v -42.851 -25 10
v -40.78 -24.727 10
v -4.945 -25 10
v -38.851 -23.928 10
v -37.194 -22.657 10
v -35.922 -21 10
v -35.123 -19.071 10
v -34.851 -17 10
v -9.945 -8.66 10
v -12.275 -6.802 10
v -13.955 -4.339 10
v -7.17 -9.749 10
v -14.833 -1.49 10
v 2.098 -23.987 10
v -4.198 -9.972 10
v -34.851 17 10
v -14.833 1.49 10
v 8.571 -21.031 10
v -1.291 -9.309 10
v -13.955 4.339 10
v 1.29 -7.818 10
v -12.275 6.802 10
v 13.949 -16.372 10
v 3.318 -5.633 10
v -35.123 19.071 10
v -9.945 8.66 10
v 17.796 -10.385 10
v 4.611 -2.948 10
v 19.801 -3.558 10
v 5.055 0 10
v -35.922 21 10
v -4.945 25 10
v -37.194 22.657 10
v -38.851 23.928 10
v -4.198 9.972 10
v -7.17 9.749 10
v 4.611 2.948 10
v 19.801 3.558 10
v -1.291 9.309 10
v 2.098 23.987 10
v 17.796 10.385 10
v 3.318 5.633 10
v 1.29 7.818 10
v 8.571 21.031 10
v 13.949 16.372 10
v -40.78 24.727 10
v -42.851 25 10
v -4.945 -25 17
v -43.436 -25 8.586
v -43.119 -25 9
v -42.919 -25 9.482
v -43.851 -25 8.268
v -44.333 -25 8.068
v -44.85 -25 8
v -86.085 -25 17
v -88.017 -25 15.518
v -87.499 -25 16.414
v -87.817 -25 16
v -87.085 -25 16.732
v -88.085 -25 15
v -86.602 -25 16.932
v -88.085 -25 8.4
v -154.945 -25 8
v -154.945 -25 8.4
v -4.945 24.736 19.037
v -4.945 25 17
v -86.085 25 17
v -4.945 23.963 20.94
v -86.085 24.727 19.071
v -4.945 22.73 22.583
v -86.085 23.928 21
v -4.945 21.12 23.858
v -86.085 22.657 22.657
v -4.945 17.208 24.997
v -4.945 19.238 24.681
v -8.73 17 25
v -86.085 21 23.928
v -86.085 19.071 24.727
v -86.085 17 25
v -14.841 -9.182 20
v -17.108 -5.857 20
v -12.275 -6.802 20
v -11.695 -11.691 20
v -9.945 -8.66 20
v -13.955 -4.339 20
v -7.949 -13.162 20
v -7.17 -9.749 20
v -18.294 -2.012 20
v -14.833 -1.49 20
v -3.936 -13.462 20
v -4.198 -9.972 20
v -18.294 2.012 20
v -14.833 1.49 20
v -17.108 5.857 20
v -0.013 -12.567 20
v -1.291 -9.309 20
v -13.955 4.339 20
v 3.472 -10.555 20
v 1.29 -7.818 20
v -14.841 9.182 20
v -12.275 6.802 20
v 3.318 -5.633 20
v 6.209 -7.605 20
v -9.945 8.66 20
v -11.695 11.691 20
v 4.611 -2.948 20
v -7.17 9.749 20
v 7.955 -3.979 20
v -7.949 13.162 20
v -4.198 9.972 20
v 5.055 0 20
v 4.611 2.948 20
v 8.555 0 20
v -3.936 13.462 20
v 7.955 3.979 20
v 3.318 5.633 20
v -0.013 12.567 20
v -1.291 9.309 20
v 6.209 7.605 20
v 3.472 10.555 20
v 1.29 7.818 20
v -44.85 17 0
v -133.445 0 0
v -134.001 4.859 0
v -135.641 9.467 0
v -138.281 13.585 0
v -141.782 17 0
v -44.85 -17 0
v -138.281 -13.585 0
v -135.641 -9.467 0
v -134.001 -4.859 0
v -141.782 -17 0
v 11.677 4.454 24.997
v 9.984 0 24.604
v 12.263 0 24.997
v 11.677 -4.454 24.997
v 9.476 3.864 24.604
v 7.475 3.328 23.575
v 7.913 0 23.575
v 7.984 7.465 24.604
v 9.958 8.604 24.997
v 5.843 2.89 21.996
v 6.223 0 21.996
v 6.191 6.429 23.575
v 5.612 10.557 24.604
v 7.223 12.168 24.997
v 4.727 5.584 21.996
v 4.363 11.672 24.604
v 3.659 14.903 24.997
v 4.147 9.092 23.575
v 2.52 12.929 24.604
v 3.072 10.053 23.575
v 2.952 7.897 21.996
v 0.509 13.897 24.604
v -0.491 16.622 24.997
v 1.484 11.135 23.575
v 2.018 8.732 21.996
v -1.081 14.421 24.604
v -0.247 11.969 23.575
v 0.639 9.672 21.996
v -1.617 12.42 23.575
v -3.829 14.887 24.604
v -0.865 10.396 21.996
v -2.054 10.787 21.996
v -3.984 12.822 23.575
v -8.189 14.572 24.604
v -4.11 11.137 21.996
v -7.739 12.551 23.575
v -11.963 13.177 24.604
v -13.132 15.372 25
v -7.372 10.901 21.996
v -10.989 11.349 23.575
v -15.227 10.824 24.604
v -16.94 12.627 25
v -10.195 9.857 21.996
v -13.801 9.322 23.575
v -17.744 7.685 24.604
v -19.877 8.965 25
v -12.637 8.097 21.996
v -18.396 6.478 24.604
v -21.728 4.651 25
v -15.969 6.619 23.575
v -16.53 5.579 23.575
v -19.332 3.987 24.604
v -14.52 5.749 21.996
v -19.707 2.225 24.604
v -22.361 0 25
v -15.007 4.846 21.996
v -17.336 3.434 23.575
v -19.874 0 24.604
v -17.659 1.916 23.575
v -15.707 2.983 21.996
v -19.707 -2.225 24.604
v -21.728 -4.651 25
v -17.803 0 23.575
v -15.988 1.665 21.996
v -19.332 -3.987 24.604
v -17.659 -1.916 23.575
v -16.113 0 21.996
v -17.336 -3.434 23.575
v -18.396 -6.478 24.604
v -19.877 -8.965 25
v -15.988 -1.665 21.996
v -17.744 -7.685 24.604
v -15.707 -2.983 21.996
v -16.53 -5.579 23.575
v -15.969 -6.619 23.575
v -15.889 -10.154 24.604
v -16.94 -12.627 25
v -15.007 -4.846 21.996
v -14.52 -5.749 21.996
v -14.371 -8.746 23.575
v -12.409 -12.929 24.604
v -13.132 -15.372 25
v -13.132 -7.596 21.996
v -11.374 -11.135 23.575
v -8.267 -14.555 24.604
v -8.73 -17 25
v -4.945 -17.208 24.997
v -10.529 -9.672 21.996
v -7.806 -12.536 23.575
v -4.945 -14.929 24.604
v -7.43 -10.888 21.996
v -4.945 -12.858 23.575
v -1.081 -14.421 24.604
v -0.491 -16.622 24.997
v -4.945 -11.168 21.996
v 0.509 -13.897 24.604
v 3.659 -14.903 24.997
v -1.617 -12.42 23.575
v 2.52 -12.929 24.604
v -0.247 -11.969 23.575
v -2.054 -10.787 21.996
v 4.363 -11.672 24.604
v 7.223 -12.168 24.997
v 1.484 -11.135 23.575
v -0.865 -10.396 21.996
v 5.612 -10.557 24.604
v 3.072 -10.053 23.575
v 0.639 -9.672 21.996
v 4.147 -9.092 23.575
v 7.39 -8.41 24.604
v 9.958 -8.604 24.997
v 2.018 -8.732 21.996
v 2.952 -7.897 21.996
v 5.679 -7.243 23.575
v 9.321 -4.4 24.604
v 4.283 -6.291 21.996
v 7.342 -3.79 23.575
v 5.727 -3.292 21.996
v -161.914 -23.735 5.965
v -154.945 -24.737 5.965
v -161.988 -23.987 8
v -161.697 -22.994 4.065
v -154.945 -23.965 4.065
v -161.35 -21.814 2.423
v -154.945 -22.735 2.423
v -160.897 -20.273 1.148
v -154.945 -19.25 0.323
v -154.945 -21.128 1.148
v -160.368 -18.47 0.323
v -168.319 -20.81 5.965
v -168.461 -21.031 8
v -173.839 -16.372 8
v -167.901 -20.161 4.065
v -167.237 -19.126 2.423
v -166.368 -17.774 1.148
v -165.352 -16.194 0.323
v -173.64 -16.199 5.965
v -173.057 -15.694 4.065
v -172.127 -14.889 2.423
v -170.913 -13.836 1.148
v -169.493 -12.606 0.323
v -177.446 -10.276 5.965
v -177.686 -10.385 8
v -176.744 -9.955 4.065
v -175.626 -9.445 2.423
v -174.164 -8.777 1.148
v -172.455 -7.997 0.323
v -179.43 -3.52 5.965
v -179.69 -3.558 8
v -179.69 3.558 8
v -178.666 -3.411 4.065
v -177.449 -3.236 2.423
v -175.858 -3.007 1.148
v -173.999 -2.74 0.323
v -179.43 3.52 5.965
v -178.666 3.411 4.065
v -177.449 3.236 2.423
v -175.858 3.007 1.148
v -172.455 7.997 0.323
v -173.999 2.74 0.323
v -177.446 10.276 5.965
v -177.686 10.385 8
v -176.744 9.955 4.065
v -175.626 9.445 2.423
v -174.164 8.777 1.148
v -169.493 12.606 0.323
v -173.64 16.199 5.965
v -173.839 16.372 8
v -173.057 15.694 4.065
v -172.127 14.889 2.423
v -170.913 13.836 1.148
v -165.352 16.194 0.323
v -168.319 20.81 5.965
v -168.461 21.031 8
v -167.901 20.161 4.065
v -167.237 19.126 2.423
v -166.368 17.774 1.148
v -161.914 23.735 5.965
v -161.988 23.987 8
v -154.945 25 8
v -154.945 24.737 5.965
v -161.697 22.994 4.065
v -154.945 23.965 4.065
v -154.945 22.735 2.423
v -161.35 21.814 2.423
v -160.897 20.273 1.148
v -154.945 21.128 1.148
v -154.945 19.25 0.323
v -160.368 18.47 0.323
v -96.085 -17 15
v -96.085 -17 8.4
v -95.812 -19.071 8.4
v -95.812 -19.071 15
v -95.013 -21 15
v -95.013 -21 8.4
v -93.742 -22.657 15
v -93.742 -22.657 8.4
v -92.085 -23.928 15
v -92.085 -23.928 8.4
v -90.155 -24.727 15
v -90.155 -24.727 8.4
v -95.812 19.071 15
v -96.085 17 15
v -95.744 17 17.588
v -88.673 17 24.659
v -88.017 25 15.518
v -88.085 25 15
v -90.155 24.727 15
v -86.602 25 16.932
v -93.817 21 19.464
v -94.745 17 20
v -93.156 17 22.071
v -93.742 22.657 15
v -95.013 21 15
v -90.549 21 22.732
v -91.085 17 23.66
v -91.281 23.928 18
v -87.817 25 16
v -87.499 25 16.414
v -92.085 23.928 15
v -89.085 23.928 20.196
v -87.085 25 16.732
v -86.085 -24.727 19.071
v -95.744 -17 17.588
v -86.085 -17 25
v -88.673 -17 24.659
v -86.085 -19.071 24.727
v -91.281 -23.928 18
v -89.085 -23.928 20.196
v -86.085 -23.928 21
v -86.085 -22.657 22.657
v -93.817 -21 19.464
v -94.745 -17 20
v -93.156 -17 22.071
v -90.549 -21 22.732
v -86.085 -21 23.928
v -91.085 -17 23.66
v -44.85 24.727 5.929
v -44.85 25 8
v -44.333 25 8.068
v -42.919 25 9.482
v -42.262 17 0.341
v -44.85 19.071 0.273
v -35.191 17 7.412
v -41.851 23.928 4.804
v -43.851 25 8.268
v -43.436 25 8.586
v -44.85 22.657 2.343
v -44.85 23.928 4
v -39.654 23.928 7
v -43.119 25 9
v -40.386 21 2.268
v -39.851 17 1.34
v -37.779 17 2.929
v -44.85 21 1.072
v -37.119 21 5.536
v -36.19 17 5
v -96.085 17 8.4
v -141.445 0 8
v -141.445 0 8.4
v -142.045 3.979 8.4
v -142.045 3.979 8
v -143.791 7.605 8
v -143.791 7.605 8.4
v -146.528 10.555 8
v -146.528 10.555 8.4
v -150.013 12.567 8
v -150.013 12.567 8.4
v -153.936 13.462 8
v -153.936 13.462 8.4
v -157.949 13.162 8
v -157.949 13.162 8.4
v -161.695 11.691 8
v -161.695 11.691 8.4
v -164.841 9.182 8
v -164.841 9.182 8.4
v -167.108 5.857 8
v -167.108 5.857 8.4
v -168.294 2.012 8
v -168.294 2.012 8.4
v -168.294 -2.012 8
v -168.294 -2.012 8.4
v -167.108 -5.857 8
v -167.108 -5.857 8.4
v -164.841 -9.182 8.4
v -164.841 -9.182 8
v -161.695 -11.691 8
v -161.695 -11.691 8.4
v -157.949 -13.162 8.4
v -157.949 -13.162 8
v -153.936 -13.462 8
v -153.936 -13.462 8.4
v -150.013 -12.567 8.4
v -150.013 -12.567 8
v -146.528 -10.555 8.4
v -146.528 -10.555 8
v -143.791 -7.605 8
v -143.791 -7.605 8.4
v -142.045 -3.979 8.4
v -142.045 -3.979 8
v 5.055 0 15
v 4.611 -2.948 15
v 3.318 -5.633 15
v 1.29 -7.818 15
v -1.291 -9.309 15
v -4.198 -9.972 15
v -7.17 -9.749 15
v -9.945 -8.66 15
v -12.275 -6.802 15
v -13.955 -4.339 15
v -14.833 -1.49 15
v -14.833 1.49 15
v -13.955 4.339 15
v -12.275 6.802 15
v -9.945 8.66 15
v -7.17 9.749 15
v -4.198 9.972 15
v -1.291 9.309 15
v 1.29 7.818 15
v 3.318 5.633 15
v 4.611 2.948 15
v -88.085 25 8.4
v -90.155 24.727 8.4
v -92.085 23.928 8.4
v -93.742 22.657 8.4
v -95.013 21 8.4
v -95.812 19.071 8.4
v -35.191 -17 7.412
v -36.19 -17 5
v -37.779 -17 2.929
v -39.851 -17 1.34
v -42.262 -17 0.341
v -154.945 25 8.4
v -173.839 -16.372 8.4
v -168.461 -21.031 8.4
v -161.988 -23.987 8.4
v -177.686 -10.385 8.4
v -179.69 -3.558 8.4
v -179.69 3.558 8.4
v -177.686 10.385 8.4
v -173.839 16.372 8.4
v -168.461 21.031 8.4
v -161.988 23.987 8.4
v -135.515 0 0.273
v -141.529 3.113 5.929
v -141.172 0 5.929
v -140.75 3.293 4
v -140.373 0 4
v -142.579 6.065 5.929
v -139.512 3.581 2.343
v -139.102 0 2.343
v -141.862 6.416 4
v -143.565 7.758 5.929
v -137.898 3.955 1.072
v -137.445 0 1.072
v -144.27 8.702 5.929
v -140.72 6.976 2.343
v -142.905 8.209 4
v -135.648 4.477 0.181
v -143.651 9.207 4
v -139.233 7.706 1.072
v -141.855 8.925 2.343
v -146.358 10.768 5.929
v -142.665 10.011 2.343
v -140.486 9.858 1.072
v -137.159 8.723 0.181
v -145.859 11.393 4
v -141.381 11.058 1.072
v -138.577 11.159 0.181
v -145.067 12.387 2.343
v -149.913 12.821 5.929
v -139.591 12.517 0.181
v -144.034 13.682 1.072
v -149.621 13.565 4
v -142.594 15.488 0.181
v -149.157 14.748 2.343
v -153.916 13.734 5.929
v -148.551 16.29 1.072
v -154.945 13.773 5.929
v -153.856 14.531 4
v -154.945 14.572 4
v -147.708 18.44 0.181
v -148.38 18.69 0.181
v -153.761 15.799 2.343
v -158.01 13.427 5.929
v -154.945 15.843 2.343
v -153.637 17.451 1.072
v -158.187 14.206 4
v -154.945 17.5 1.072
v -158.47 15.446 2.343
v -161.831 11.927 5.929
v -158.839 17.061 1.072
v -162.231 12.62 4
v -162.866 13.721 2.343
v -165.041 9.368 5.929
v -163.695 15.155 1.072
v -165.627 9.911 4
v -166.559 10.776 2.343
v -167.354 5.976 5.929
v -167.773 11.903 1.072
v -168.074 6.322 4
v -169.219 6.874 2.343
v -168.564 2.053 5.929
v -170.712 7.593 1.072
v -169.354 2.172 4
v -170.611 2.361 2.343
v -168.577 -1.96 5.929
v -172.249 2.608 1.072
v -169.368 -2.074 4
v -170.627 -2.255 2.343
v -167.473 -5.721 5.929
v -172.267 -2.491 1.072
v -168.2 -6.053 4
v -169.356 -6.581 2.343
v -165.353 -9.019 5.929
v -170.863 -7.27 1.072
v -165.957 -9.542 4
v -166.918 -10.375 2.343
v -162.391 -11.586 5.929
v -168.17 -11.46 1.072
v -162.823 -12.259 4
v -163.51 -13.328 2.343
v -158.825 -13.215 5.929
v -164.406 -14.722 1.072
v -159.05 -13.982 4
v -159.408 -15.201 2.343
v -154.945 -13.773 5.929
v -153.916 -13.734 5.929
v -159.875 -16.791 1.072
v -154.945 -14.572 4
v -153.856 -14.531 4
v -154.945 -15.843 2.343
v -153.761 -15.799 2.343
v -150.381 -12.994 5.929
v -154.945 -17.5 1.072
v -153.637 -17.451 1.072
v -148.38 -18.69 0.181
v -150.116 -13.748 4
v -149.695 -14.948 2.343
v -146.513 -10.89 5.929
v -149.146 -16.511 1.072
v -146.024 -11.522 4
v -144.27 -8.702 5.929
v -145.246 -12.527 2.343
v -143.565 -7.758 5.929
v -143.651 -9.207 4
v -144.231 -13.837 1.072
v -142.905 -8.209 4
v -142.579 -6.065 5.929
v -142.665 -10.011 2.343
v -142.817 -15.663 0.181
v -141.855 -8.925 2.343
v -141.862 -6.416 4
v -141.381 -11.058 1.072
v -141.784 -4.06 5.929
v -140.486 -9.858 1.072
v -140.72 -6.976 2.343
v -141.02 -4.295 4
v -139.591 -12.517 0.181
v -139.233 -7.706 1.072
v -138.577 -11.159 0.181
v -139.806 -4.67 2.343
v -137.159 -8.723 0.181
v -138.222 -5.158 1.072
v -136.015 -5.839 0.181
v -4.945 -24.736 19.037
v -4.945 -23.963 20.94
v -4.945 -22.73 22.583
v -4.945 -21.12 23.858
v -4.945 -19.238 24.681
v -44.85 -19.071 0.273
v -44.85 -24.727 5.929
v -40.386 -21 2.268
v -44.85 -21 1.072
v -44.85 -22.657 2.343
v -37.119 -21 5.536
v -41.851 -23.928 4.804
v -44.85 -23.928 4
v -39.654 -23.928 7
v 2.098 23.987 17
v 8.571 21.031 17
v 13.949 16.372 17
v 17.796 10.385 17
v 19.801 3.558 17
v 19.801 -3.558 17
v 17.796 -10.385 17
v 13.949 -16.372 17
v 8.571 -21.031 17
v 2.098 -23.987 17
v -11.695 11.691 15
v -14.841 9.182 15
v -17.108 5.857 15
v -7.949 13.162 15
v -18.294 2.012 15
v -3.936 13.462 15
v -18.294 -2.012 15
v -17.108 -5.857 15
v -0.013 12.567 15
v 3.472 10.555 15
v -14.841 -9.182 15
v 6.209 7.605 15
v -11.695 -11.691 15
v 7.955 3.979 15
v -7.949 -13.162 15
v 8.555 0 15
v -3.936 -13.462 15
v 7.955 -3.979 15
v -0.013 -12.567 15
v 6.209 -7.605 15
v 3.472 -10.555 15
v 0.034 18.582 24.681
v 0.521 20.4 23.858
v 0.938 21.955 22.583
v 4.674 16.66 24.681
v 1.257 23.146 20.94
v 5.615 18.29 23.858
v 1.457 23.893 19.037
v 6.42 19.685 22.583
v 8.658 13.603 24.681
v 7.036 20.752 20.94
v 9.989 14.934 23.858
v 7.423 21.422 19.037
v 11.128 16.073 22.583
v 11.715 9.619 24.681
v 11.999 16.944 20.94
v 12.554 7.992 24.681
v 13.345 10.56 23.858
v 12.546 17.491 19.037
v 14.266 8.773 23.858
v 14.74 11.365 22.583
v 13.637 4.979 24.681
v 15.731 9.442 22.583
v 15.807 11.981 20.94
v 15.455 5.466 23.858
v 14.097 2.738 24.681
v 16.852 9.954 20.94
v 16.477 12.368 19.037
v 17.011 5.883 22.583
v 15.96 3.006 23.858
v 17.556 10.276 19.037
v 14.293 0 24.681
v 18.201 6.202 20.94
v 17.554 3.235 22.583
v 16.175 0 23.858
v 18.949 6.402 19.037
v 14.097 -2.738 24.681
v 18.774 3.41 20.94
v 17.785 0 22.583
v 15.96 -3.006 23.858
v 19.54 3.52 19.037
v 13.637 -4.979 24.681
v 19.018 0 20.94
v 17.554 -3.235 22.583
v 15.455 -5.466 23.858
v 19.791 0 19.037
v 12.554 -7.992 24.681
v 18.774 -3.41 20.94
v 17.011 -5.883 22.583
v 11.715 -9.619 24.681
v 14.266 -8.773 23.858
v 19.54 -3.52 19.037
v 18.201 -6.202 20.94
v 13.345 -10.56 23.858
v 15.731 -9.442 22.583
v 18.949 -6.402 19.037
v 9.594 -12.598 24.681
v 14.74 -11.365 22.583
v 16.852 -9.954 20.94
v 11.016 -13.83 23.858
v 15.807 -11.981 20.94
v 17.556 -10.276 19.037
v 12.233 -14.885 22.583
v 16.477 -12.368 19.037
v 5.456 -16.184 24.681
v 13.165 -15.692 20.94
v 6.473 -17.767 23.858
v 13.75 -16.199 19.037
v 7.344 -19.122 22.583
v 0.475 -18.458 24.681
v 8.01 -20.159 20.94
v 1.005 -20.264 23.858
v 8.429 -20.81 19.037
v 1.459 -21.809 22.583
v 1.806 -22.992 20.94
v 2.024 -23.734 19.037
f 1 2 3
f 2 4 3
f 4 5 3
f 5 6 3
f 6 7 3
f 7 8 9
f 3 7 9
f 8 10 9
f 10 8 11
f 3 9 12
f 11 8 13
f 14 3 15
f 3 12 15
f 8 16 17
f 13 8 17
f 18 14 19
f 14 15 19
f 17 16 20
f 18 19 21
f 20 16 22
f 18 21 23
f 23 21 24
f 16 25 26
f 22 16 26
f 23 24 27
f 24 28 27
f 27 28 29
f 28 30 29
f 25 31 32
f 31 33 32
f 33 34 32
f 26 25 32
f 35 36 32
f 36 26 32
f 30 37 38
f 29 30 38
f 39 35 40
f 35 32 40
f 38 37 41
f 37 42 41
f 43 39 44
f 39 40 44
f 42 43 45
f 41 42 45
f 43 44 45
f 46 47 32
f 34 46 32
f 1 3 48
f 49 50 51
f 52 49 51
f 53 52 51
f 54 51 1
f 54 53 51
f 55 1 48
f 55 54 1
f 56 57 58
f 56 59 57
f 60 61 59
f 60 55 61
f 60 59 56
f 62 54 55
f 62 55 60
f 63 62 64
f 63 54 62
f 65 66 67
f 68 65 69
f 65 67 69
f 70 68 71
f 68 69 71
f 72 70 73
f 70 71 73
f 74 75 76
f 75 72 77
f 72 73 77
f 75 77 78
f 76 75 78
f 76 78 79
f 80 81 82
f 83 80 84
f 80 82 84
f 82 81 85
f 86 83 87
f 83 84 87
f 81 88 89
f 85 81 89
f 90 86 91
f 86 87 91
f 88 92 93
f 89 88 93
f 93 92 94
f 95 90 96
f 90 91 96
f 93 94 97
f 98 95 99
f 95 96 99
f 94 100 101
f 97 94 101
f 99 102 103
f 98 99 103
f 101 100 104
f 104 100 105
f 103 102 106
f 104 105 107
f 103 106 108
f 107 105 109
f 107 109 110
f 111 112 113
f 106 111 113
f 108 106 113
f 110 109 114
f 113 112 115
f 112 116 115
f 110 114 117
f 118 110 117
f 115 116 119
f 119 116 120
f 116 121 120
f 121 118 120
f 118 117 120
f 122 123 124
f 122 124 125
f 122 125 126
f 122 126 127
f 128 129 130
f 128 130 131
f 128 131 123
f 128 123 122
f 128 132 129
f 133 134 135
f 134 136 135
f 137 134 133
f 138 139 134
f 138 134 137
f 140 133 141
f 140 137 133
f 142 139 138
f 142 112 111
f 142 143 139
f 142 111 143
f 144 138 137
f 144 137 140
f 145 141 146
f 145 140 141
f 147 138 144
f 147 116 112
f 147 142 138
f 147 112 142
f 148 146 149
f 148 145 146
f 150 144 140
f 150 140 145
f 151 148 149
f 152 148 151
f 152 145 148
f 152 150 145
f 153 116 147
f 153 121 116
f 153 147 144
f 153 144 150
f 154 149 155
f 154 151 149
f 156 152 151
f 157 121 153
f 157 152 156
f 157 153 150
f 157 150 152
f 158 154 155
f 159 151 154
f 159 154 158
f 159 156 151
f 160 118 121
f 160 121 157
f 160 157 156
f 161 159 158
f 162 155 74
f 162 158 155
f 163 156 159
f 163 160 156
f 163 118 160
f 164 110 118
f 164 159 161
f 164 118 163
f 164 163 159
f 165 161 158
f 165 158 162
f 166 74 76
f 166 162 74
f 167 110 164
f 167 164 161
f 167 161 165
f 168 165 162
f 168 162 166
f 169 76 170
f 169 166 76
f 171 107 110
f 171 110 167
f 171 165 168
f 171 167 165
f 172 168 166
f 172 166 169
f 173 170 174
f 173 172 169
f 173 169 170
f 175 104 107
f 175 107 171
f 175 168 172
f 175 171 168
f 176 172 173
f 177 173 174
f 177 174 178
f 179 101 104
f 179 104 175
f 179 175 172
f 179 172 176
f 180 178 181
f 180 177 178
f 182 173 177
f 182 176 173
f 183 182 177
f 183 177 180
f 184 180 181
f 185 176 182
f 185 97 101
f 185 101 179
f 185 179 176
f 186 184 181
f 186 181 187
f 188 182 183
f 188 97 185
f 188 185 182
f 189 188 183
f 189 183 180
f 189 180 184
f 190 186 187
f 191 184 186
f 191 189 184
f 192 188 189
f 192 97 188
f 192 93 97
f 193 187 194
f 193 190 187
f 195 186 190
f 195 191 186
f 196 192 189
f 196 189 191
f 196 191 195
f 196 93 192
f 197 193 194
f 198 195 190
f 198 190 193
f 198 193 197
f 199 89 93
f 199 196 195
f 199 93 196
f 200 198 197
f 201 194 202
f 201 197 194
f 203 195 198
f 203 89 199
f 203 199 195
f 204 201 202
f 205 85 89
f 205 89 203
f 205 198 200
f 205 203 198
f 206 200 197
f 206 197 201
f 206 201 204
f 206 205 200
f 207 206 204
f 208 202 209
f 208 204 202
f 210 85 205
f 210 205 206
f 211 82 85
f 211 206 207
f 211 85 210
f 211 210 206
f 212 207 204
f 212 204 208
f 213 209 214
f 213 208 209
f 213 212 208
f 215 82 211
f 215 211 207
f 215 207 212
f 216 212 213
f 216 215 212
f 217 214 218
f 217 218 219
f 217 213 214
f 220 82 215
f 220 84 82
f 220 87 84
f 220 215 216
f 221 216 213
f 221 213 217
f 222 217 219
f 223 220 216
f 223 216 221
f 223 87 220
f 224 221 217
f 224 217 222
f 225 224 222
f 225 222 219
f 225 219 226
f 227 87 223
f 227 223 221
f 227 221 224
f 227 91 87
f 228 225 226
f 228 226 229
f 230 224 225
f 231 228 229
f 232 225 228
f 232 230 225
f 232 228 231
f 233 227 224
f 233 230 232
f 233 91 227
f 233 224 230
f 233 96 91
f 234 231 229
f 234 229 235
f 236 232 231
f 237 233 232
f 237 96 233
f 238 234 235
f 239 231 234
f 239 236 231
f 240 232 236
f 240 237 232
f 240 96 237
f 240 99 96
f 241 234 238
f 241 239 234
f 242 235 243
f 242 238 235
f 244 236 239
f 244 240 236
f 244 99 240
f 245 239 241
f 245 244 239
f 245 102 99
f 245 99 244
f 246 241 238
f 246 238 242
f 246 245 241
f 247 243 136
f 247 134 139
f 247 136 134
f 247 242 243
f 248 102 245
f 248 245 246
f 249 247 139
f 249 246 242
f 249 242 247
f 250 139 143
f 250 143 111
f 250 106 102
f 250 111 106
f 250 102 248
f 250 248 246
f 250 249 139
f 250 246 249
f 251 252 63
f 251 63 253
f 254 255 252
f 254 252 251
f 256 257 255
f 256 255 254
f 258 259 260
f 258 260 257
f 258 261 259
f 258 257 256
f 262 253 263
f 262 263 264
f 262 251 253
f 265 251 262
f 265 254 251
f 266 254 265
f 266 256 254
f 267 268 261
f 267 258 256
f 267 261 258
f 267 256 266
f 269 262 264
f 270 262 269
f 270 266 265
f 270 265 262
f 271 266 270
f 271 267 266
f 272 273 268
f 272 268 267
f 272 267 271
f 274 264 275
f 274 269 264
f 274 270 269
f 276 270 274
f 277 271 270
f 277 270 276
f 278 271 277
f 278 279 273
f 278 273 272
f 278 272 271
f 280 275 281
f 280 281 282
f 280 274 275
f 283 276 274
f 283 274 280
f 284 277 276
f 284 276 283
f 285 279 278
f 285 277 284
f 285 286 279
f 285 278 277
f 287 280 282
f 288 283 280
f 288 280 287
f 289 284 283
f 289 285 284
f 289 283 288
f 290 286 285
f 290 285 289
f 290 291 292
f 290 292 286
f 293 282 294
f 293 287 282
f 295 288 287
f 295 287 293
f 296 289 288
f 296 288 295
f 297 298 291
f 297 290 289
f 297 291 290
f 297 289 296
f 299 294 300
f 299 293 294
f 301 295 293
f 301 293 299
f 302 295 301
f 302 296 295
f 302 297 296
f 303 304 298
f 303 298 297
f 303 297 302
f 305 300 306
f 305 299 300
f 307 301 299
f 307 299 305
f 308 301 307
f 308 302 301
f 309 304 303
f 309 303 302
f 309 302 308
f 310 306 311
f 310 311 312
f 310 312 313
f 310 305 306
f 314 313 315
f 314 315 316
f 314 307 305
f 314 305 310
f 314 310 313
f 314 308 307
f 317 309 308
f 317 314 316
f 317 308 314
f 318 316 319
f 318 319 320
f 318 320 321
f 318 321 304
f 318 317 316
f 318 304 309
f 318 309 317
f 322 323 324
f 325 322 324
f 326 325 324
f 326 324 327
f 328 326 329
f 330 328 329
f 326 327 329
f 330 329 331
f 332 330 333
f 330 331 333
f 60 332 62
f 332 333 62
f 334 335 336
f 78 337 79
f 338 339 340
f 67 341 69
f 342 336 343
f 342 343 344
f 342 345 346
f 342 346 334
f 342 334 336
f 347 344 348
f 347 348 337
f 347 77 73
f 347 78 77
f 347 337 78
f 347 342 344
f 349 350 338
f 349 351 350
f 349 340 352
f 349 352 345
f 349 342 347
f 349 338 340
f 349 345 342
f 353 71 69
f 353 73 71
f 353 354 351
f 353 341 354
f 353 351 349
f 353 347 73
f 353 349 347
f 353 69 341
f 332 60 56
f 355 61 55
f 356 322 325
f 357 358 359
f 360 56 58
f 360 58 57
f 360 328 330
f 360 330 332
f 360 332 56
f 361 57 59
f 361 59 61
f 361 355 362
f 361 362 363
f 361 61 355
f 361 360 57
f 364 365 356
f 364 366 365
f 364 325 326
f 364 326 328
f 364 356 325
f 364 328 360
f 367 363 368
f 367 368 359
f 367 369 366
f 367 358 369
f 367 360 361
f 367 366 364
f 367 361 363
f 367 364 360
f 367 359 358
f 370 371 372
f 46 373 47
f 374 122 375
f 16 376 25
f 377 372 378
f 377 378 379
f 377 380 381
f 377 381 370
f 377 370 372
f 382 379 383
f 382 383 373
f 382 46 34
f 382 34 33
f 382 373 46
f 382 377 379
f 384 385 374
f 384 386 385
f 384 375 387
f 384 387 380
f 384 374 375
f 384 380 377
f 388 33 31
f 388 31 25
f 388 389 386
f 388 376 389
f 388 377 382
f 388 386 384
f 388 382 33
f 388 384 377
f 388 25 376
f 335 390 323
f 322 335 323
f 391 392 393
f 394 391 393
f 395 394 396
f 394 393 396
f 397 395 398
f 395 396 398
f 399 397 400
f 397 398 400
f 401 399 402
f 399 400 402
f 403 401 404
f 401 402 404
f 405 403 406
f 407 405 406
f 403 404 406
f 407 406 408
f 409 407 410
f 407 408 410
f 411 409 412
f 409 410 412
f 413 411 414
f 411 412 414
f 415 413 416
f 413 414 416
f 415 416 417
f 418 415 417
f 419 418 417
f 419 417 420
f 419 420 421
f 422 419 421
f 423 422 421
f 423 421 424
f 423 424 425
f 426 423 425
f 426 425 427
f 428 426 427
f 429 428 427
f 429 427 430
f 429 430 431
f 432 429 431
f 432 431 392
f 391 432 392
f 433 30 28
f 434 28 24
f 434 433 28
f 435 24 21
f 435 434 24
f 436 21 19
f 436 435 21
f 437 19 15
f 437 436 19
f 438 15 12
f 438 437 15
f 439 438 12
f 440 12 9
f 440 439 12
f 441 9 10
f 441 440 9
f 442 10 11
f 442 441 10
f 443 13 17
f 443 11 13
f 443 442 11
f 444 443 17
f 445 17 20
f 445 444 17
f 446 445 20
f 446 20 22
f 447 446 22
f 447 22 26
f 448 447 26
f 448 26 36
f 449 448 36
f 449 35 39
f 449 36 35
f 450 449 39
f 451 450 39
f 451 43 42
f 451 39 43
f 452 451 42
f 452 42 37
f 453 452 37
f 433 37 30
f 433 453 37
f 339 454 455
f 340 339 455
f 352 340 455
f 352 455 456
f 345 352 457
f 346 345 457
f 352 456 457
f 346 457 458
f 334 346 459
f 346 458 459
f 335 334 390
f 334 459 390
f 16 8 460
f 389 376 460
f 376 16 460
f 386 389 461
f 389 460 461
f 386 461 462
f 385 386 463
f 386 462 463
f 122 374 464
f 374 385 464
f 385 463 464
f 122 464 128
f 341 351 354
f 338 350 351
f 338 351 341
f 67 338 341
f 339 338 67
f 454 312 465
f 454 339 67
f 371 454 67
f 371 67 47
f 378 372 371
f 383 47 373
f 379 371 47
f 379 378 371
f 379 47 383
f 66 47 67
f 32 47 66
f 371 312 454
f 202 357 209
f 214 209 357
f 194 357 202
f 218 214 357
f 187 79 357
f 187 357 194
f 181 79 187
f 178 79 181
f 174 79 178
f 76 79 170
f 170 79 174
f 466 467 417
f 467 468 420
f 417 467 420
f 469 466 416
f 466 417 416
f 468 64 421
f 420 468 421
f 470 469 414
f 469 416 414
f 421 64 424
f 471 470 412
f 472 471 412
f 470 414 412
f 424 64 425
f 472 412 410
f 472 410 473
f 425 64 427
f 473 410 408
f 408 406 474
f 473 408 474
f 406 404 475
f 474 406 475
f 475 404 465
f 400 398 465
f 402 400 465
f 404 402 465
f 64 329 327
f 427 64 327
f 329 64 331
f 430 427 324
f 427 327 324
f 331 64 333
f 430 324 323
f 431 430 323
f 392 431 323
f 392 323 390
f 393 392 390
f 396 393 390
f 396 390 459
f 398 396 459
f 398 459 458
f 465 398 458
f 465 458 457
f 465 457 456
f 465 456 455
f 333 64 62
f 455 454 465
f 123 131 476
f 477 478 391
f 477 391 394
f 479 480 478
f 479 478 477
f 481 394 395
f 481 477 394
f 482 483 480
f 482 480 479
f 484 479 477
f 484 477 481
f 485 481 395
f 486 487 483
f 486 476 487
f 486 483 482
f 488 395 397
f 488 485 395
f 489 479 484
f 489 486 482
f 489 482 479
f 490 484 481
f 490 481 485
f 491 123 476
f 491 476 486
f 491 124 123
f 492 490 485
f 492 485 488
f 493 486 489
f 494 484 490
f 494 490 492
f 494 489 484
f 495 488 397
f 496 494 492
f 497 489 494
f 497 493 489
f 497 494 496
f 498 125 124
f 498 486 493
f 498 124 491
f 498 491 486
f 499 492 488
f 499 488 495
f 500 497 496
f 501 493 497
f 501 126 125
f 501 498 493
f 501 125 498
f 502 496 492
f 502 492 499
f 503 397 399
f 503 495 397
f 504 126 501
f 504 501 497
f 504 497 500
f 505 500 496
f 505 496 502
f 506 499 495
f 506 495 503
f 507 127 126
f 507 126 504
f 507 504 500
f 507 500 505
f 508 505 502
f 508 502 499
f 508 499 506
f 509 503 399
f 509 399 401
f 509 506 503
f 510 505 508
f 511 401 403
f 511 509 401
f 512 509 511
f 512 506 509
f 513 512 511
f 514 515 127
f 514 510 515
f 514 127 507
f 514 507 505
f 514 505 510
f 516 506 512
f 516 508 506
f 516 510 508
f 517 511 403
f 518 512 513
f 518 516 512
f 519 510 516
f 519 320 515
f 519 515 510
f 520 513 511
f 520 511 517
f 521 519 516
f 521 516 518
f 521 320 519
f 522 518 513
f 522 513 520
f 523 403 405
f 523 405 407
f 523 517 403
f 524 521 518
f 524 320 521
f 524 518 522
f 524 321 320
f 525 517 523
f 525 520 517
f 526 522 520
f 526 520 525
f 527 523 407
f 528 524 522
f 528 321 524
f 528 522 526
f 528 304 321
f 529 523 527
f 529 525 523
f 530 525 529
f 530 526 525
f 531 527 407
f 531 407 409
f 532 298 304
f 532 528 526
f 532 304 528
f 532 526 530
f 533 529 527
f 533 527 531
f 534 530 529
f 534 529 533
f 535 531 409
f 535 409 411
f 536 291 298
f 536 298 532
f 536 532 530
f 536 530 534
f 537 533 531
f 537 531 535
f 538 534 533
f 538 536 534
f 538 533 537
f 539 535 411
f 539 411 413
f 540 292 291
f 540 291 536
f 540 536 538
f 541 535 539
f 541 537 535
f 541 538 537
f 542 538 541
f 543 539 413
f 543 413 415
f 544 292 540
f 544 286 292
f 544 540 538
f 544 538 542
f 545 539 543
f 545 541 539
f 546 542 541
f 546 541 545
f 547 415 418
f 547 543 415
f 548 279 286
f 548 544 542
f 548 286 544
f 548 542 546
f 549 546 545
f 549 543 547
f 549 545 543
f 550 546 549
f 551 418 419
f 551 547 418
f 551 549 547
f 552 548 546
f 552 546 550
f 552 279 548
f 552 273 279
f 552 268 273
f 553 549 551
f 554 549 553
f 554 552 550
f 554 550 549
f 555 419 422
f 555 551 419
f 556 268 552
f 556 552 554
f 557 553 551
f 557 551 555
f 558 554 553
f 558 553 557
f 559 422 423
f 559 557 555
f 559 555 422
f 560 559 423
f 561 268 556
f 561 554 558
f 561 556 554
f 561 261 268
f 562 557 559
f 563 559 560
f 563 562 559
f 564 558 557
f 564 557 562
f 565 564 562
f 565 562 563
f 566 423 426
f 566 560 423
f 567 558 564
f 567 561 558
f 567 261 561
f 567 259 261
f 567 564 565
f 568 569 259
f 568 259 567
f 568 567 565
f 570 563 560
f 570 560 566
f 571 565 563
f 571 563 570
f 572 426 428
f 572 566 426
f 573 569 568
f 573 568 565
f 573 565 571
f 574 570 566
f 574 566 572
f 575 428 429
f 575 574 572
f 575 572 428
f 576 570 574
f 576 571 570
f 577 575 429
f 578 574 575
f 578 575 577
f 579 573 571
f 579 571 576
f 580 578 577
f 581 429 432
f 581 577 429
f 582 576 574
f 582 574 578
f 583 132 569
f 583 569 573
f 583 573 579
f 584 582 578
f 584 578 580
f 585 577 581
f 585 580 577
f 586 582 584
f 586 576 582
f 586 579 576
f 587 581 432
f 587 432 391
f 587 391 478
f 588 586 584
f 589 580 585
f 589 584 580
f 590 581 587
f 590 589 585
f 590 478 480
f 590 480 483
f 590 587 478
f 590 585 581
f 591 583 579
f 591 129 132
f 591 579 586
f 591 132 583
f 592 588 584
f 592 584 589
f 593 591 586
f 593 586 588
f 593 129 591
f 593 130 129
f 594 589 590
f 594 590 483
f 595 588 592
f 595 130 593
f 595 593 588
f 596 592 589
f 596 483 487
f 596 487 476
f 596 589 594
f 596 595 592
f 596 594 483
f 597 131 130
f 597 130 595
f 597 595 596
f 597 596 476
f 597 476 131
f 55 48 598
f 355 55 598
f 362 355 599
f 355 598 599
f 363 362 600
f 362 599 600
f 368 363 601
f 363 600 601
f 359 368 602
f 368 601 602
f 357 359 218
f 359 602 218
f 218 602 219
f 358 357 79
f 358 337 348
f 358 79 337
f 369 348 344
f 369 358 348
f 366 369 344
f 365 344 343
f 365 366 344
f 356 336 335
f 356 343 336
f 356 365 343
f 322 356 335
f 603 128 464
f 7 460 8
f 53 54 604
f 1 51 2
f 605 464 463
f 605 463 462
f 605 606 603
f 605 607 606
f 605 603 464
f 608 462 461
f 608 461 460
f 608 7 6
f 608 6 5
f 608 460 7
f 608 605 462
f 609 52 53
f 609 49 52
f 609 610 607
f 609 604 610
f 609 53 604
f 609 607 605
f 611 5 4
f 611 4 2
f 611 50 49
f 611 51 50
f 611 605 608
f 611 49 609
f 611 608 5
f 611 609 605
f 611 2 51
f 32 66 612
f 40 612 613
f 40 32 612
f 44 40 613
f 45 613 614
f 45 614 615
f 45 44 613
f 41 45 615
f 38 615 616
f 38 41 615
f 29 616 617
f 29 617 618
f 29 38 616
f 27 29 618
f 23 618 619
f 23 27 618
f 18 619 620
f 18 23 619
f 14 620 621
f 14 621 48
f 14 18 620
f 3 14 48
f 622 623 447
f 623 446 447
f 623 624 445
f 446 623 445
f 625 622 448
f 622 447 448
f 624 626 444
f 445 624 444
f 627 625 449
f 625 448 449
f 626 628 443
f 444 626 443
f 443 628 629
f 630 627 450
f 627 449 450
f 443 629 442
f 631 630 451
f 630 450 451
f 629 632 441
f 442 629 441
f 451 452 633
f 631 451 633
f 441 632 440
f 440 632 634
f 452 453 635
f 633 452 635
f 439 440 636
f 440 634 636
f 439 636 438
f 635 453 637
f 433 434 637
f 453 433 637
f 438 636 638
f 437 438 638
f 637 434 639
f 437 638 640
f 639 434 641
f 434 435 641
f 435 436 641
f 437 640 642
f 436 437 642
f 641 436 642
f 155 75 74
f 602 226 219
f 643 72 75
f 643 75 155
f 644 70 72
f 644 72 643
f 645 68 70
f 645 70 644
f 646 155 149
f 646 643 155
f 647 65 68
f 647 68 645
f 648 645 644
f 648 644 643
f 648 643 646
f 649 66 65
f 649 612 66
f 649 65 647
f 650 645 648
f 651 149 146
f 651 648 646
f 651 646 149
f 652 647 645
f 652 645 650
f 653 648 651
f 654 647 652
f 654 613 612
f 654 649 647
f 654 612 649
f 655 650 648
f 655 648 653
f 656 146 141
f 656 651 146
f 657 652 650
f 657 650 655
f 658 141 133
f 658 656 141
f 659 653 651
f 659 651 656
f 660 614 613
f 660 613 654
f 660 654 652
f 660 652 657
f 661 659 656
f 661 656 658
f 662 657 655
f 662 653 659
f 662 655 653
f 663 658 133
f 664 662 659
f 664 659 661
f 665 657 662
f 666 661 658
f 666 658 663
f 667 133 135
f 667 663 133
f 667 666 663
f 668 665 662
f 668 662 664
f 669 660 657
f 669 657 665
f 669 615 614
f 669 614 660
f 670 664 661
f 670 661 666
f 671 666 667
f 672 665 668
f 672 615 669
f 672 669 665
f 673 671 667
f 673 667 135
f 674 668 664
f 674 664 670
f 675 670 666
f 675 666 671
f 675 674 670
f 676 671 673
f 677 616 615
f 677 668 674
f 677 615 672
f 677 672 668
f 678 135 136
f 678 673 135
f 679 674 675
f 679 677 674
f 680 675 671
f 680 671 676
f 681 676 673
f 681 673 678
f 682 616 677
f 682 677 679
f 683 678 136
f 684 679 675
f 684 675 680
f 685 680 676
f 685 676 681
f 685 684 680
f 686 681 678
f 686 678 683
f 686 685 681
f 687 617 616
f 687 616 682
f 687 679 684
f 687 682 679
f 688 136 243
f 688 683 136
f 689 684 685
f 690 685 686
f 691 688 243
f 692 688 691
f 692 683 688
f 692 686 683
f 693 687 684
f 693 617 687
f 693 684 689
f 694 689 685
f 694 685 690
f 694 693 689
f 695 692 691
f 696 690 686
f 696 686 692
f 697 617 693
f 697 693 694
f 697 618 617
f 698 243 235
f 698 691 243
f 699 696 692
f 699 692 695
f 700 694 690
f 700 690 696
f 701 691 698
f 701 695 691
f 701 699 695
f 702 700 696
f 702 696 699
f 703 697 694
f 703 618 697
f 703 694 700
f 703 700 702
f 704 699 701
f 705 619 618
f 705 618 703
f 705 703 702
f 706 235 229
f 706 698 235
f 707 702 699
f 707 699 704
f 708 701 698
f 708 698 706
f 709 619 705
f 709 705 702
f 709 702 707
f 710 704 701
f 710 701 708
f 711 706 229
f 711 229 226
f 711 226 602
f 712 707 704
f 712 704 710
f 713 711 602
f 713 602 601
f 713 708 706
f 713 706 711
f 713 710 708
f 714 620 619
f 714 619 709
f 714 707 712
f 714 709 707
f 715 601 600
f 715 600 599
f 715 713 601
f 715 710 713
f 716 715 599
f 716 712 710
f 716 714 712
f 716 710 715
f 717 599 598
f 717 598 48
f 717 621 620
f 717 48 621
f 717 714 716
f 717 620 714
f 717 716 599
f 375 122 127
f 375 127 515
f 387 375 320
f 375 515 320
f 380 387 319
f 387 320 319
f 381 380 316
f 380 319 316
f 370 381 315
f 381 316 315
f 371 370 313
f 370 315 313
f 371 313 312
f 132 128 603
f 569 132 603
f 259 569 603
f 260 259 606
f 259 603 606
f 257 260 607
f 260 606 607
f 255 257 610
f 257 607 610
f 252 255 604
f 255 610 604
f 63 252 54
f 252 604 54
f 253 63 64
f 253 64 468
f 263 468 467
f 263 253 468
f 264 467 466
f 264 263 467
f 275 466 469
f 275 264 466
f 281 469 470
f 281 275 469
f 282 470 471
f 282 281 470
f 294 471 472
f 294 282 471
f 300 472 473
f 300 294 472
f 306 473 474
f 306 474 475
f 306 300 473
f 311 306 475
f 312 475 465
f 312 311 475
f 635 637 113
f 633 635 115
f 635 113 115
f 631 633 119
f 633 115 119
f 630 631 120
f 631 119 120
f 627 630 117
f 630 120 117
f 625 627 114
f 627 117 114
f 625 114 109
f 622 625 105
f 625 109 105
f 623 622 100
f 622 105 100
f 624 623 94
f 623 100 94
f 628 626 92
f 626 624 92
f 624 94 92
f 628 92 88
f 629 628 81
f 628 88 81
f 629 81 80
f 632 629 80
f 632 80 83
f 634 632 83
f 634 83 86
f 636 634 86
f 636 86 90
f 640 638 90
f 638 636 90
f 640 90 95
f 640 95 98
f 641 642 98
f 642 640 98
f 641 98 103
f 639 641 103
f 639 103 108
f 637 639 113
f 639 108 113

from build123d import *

# Parameters (mm, degrees)
BOSS_EXTRUDE1_DEPTH = 25
SKETCH2_R           = 13.5
CUT_EXTRUDE1_DEPTH  = 25
SKETCH3_R           = 13.5
CUT_EXTRUDE2_DEPTH  = 25
SKETCH4_R           = 13.5
SKETCH4_R_2         = 10
BOSS_EXTRUDE2_DEPTH = 5
BOSS_EXTRUDE3_START = -15
SKETCH5_R           = 13.5
SKETCH5_R_2         = 10
BOSS_EXTRUDE3_DEPTH = 15
CUT_EXTRUDE3_DEPTH  = 10
SKETCH7_R           = 13.468633883
BOSS_EXTRUDE4_DEPTH = 3
CUT_EXTRUDE4_START  = -16.6
CUT_EXTRUDE4_DEPTH  = 16.6
FILLET1_R           = 10
FILLET2_R           = 10
FILLET4_R           = 8


# Some blends are built 0.0001 mm under size
with BuildPart() as part:
    # Sketch1 → Boss-Extrude1 (new body)
    with BuildSketch(Plane.XY):
        with BuildLine():
            Line((-154.944852941, 25), (-4.944852941, 25))
            ThreePointArc((-4.944852941, 25), (20.055147059, 0), (-4.944852941, -25))
            Line((-4.944852941, -25), (-154.944852941, -25))
            ThreePointArc((-154.944852941, -25), (-179.944852941, 0), (-154.944852941, 25))
        make_face()
    extrude(amount=BOSS_EXTRUDE1_DEPTH)

    # Sketch2 → Cut-Extrude1 (cut)
    with BuildSketch(Plane.XY.offset(25)):
        with Locations((-4.944852941, 0)):
            Circle(SKETCH2_R)
    extrude(amount=-CUT_EXTRUDE1_DEPTH, mode=Mode.SUBTRACT)

    # Sketch3 → Cut-Extrude2 (cut)
    with BuildSketch(Plane.XY.offset(25)):
        with Locations((-154.944852941, 0)):
            Circle(SKETCH3_R)
    extrude(amount=-CUT_EXTRUDE2_DEPTH, mode=Mode.SUBTRACT)

    # Sketch4 → Boss-Extrude2 (add)
    with BuildSketch(Plane.XY.offset(25)):
        with Locations((-4.944852941, 0)):
            Circle(SKETCH4_R)
        with Locations((-4.944852941, 0)):
            Circle(SKETCH4_R_2, mode=Mode.SUBTRACT)
    extrude(amount=-BOSS_EXTRUDE2_DEPTH)

    # Sketch5 → Boss-Extrude3 (add)
    with BuildSketch(Plane(origin=(0, 0, 0), x_dir=(-1, 0, 0), z_dir=(0, 0, -1)).offset(BOSS_EXTRUDE3_START)):
        with Locations(Location((4.944852941, 0, 0), (0, 0, 180))):
            Circle(SKETCH5_R)
        with Locations(Location((4.944852941, 0, 0), (0, 0, 180))):
            Circle(SKETCH5_R_2, mode=Mode.SUBTRACT)
    extrude(amount=BOSS_EXTRUDE3_DEPTH)

    # Sketch6 → Cut-Extrude3 (cut)
    with BuildSketch(Plane(origin=(0, 0, 0), x_dir=(-1, 0, 0), z_dir=(0, 0, -1))):
        with BuildLine():
            Line((4.944852941, 25), (34.850592548, 25))
            Line((34.850592548, 25), (34.850592548, -25))
            Line((34.850592548, -25), (4.944852941, -25))
            ThreePointArc((4.944852941, -25), (-20.055147059, 0), (4.944852941, 25))
        make_face()
    extrude(amount=-CUT_EXTRUDE3_DEPTH, mode=Mode.SUBTRACT)


with BuildPart() as body_2:
    # Sketch7 → Boss-Extrude4 (new body)
    with BuildSketch(Plane.XY.offset(25)):
        with Locations((-154.944852941, 0)):
            Circle(SKETCH7_R)
    extrude(amount=-BOSS_EXTRUDE4_DEPTH)


with BuildPart() as cut_extrude4_tool:
    # Sketch9 → Cut-Extrude4 (new body)
    with BuildSketch(Plane.XY.offset(25).offset(CUT_EXTRUDE4_START)):
        with BuildLine():
            Line((-96.084788757, 25), (-96.084788757, -25))
            Line((-96.084788757, -25), (-154.944852941, -25))
            ThreePointArc((-154.944852941, -25), (-179.944852941, 0), (-154.944852941, 25))
            Line((-154.944852941, 25), (-96.084788757, 25))
        make_face()
    extrude(amount=CUT_EXTRUDE4_DEPTH)


with BuildPart() as part_1:
    add(part.part)

    # Cut-Extrude4: cut by cut_extrude4_tool
    add(cut_extrude4_tool.part, mode=Mode.SUBTRACT)

    # Fillet1
    fillet1_edges = [part_1.edges().sort_by_distance(p)[0] for p in [
        (-96.084788757, 0, 25),
    ]]
    fillet(fillet1_edges, radius=FILLET1_R)

    # Fillet2
    fillet2_edges = [part_1.edges().sort_by_distance(p)[0] for p in [
        (-34.850592548, 0, 0),
    ]]
    fillet(fillet2_edges, radius=FILLET2_R - 0.0001)  # a hair under: the kernel refuses the full size

    # Fillet4
    # the kernel refuses this fillet: 8 mm, written as the material it takes off along each edge
    with BuildSketch(Plane(origin=(-4.944852941, 0, 25), x_dir=(0, 1, 0), z_dir=(-1, 0, 0))) as fillet4_piece_1:
        with BuildLine():
            CenterArc((25 - FILLET4_R, FILLET4_R), FILLET4_R, 270, 90)
            Line((25 - FILLET4_R, 0), (25, 0))
            Line((25, 0), (25, FILLET4_R))
        make_face()
    revolve(axis=Axis((-4.944852941, 0, 25), (0, 0, -1)), revolution_arc=180, mode=Mode.SUBTRACT)
    with BuildSketch(Plane(origin=(-86.084788757, 25, 25), x_dir=(0, -1, 0), z_dir=(1, 0, 0))) as fillet4_piece_2:
        with BuildLine():
            CenterArc((FILLET4_R, FILLET4_R), FILLET4_R, 180, 90)
            Line((0, FILLET4_R), (0, 0))
            Line((0, 0), (FILLET4_R, 0))
        make_face()
    extrude(amount=81.139935816, mode=Mode.SUBTRACT)
    with BuildSketch(Plane(origin=(-154.944852941, 0, 0), x_dir=(1, 0, 0), z_dir=(0, -1, 0))) as fillet4_piece_3:
        with BuildLine():
            CenterArc((13.5 + FILLET4_R, FILLET4_R), FILLET4_R, 180, 90)
            Line((13.5, FILLET4_R), (13.5, 0))
            Line((13.5, 0), (13.5 + FILLET4_R, 0))
        make_face()
    revolve(axis=Axis((-154.944852941, 0, 0), (0, 0, 1)), mode=Mode.SUBTRACT)
    with BuildSketch(Plane(origin=(-4.944852941, 0, 25), x_dir=(1, 0, 0), z_dir=(0, -1, 0))) as fillet4_piece_4:
        with BuildLine():
            CenterArc((17.416198487, -8), FILLET4_R, 90, 67.975687163)
            Line((10, -5), (10, 0))
            Line((10, 0), (17.416198487, 0))
        make_face()
    revolve(axis=Axis((-4.944852941, 0, 25), (0, 0, 1)), mode=Mode.SUBTRACT)
    with BuildSketch(Plane(origin=(-44.850492548, -25, 0), x_dir=(0, 0, 1), z_dir=(-1, 0, 0))) as fillet4_piece_5:
        with BuildLine():
            CenterArc((FILLET4_R, FILLET4_R), FILLET4_R, 180, 90)
            Line((0, FILLET4_R), (0, 0))
            Line((0, 0), (FILLET4_R, 0))
        make_face()
    extrude(amount=110.094360393, mode=Mode.SUBTRACT)
    with BuildSketch(Plane(origin=(-154.944852941, 0, 0), x_dir=(0, -1, 0), z_dir=(1, 0, 0))) as fillet4_piece_6:
        with BuildLine():
            CenterArc((25 - FILLET4_R, -FILLET4_R), FILLET4_R, 0, 90)
            Line((25, -FILLET4_R), (25, 0))
            Line((25, 0), (25 - FILLET4_R, 0))
        make_face()
    revolve(axis=Axis((-154.944852941, 0, 0), (0, 0, -1)), revolution_arc=180, mode=Mode.SUBTRACT)
    with BuildSketch(Plane(origin=(-96.084788757, 25, 8.4), x_dir=(0, -1, 0), z_dir=(0, 0, 1)), Plane(origin=(-96.084788757, -25, 8.4), x_dir=(1, 0, 0), z_dir=(0, 0, 1))) as fillet4_piece_7:
        with BuildLine():
            CenterArc((FILLET4_R, FILLET4_R), FILLET4_R, 180, 90)
            Line((0, FILLET4_R), (0, 0))
            Line((0, 0), (FILLET4_R, 0))
        make_face()
    extrude(amount=6.6, mode=Mode.SUBTRACT)
    with BuildSketch(Plane(origin=(-86.084788757, 25, 15), x_dir=(-1, 0, 0), z_dir=(0, 0, -1))) as fillet4_piece_8:
        with BuildLine():
            CenterArc((10 - FILLET4_R, -FILLET4_R), FILLET4_R, 0, 90)
            Line((10 - FILLET4_R, 0), (10, 0))
            Line((10, 0), (10, -FILLET4_R))
        make_face()
    revolve(axis=Axis((-86.084788757, 25, 15), (0, 1, 0)), revolution_arc=90, mode=Mode.SUBTRACT)
    with BuildSketch(Plane(origin=(-4.944852941, -25, 25), x_dir=(0, 0, -1), z_dir=(-1, 0, 0))) as fillet4_piece_9:
        with BuildLine():
            CenterArc((FILLET4_R, -FILLET4_R), FILLET4_R, 90, 90)
            Line((0, -FILLET4_R), (0, 0))
            Line((0, 0), (FILLET4_R, 0))
        make_face()
    extrude(amount=81.139935816, mode=Mode.SUBTRACT)
    with BuildSketch(Plane(origin=(-86.084788757, -25, 15), x_dir=(-1, 0, 0), z_dir=(0, 0, -1))) as fillet4_piece_10:
        with BuildLine():
            CenterArc((10 - FILLET4_R, FILLET4_R), FILLET4_R, 270, 90)
            Line((10, FILLET4_R), (10, 0))
            Line((10, 0), (10 - FILLET4_R, 0))
        make_face()
    revolve(axis=Axis((-86.084788757, -25, 15), (0, 1, 0)), revolution_arc=90, mode=Mode.SUBTRACT)
    with BuildSketch(Plane(origin=(-154.944852941, 25, 0), x_dir=(0, -1, 0), z_dir=(1, 0, 0))) as fillet4_piece_11:
        with BuildLine():
            CenterArc((FILLET4_R, -FILLET4_R), FILLET4_R, 90, 90)
            Line((0, -FILLET4_R), (0, 0))
            Line((0, 0), (FILLET4_R, 0))
        make_face()
    extrude(amount=110.094360393, mode=Mode.SUBTRACT)
    with BuildSketch(Plane(origin=(-44.850492548, 25, 9.9999), x_dir=(0, 0, -1), z_dir=(-1, 0, 0))) as fillet4_piece_12:
        with BuildLine():
            CenterArc((9.9999 - FILLET4_R, FILLET4_R), FILLET4_R, 270, 90)
            Line((9.9999 - FILLET4_R, 0), (9.9999, 0))
            Line((9.9999, 0), (9.9999, FILLET4_R))
        make_face()
    revolve(axis=Axis((-44.850492548, 25, 9.9999), (0, -1, 0)), revolution_arc=90, mode=Mode.SUBTRACT)
    with BuildSketch(Plane(origin=(-44.850492548, -25, 9.9999), x_dir=(0, 0, -1), z_dir=(-1, 0, 0))) as fillet4_piece_13:
        with BuildLine():
            CenterArc((9.9999 - FILLET4_R, -FILLET4_R), FILLET4_R, 0, 90)
            Line((9.9999, -FILLET4_R), (9.9999, 0))
            Line((9.9999, 0), (9.9999 - FILLET4_R, 0))
        make_face()
    revolve(axis=Axis((-44.850492548, -25, 9.9999), (0, -1, 0)), revolution_arc=90, mode=Mode.SUBTRACT)
    with BuildSketch(Plane(origin=(-34.850592548, -25, 9.9999), x_dir=(-1, 0, 0), z_dir=(0, 0, 1)), Plane(origin=(-34.850592548, 25, 9.9999), x_dir=(0, -1, 0), z_dir=(0, 0, 1))) as fillet4_piece_14:
        with BuildLine():
            CenterArc((FILLET4_R, -FILLET4_R), FILLET4_R, 90, 90)
            Line((0, -FILLET4_R), (0, 0))
            Line((0, 0), (FILLET4_R, 0))
        make_face()
    extrude(amount=0.0001, mode=Mode.SUBTRACT)


with BuildPart() as body_2_1:
    add(body_2.part)

    # Cut-Extrude4: cut by cut_extrude4_tool
    add(cut_extrude4_tool.part, mode=Mode.SUBTRACT)


solid = part_1.part
